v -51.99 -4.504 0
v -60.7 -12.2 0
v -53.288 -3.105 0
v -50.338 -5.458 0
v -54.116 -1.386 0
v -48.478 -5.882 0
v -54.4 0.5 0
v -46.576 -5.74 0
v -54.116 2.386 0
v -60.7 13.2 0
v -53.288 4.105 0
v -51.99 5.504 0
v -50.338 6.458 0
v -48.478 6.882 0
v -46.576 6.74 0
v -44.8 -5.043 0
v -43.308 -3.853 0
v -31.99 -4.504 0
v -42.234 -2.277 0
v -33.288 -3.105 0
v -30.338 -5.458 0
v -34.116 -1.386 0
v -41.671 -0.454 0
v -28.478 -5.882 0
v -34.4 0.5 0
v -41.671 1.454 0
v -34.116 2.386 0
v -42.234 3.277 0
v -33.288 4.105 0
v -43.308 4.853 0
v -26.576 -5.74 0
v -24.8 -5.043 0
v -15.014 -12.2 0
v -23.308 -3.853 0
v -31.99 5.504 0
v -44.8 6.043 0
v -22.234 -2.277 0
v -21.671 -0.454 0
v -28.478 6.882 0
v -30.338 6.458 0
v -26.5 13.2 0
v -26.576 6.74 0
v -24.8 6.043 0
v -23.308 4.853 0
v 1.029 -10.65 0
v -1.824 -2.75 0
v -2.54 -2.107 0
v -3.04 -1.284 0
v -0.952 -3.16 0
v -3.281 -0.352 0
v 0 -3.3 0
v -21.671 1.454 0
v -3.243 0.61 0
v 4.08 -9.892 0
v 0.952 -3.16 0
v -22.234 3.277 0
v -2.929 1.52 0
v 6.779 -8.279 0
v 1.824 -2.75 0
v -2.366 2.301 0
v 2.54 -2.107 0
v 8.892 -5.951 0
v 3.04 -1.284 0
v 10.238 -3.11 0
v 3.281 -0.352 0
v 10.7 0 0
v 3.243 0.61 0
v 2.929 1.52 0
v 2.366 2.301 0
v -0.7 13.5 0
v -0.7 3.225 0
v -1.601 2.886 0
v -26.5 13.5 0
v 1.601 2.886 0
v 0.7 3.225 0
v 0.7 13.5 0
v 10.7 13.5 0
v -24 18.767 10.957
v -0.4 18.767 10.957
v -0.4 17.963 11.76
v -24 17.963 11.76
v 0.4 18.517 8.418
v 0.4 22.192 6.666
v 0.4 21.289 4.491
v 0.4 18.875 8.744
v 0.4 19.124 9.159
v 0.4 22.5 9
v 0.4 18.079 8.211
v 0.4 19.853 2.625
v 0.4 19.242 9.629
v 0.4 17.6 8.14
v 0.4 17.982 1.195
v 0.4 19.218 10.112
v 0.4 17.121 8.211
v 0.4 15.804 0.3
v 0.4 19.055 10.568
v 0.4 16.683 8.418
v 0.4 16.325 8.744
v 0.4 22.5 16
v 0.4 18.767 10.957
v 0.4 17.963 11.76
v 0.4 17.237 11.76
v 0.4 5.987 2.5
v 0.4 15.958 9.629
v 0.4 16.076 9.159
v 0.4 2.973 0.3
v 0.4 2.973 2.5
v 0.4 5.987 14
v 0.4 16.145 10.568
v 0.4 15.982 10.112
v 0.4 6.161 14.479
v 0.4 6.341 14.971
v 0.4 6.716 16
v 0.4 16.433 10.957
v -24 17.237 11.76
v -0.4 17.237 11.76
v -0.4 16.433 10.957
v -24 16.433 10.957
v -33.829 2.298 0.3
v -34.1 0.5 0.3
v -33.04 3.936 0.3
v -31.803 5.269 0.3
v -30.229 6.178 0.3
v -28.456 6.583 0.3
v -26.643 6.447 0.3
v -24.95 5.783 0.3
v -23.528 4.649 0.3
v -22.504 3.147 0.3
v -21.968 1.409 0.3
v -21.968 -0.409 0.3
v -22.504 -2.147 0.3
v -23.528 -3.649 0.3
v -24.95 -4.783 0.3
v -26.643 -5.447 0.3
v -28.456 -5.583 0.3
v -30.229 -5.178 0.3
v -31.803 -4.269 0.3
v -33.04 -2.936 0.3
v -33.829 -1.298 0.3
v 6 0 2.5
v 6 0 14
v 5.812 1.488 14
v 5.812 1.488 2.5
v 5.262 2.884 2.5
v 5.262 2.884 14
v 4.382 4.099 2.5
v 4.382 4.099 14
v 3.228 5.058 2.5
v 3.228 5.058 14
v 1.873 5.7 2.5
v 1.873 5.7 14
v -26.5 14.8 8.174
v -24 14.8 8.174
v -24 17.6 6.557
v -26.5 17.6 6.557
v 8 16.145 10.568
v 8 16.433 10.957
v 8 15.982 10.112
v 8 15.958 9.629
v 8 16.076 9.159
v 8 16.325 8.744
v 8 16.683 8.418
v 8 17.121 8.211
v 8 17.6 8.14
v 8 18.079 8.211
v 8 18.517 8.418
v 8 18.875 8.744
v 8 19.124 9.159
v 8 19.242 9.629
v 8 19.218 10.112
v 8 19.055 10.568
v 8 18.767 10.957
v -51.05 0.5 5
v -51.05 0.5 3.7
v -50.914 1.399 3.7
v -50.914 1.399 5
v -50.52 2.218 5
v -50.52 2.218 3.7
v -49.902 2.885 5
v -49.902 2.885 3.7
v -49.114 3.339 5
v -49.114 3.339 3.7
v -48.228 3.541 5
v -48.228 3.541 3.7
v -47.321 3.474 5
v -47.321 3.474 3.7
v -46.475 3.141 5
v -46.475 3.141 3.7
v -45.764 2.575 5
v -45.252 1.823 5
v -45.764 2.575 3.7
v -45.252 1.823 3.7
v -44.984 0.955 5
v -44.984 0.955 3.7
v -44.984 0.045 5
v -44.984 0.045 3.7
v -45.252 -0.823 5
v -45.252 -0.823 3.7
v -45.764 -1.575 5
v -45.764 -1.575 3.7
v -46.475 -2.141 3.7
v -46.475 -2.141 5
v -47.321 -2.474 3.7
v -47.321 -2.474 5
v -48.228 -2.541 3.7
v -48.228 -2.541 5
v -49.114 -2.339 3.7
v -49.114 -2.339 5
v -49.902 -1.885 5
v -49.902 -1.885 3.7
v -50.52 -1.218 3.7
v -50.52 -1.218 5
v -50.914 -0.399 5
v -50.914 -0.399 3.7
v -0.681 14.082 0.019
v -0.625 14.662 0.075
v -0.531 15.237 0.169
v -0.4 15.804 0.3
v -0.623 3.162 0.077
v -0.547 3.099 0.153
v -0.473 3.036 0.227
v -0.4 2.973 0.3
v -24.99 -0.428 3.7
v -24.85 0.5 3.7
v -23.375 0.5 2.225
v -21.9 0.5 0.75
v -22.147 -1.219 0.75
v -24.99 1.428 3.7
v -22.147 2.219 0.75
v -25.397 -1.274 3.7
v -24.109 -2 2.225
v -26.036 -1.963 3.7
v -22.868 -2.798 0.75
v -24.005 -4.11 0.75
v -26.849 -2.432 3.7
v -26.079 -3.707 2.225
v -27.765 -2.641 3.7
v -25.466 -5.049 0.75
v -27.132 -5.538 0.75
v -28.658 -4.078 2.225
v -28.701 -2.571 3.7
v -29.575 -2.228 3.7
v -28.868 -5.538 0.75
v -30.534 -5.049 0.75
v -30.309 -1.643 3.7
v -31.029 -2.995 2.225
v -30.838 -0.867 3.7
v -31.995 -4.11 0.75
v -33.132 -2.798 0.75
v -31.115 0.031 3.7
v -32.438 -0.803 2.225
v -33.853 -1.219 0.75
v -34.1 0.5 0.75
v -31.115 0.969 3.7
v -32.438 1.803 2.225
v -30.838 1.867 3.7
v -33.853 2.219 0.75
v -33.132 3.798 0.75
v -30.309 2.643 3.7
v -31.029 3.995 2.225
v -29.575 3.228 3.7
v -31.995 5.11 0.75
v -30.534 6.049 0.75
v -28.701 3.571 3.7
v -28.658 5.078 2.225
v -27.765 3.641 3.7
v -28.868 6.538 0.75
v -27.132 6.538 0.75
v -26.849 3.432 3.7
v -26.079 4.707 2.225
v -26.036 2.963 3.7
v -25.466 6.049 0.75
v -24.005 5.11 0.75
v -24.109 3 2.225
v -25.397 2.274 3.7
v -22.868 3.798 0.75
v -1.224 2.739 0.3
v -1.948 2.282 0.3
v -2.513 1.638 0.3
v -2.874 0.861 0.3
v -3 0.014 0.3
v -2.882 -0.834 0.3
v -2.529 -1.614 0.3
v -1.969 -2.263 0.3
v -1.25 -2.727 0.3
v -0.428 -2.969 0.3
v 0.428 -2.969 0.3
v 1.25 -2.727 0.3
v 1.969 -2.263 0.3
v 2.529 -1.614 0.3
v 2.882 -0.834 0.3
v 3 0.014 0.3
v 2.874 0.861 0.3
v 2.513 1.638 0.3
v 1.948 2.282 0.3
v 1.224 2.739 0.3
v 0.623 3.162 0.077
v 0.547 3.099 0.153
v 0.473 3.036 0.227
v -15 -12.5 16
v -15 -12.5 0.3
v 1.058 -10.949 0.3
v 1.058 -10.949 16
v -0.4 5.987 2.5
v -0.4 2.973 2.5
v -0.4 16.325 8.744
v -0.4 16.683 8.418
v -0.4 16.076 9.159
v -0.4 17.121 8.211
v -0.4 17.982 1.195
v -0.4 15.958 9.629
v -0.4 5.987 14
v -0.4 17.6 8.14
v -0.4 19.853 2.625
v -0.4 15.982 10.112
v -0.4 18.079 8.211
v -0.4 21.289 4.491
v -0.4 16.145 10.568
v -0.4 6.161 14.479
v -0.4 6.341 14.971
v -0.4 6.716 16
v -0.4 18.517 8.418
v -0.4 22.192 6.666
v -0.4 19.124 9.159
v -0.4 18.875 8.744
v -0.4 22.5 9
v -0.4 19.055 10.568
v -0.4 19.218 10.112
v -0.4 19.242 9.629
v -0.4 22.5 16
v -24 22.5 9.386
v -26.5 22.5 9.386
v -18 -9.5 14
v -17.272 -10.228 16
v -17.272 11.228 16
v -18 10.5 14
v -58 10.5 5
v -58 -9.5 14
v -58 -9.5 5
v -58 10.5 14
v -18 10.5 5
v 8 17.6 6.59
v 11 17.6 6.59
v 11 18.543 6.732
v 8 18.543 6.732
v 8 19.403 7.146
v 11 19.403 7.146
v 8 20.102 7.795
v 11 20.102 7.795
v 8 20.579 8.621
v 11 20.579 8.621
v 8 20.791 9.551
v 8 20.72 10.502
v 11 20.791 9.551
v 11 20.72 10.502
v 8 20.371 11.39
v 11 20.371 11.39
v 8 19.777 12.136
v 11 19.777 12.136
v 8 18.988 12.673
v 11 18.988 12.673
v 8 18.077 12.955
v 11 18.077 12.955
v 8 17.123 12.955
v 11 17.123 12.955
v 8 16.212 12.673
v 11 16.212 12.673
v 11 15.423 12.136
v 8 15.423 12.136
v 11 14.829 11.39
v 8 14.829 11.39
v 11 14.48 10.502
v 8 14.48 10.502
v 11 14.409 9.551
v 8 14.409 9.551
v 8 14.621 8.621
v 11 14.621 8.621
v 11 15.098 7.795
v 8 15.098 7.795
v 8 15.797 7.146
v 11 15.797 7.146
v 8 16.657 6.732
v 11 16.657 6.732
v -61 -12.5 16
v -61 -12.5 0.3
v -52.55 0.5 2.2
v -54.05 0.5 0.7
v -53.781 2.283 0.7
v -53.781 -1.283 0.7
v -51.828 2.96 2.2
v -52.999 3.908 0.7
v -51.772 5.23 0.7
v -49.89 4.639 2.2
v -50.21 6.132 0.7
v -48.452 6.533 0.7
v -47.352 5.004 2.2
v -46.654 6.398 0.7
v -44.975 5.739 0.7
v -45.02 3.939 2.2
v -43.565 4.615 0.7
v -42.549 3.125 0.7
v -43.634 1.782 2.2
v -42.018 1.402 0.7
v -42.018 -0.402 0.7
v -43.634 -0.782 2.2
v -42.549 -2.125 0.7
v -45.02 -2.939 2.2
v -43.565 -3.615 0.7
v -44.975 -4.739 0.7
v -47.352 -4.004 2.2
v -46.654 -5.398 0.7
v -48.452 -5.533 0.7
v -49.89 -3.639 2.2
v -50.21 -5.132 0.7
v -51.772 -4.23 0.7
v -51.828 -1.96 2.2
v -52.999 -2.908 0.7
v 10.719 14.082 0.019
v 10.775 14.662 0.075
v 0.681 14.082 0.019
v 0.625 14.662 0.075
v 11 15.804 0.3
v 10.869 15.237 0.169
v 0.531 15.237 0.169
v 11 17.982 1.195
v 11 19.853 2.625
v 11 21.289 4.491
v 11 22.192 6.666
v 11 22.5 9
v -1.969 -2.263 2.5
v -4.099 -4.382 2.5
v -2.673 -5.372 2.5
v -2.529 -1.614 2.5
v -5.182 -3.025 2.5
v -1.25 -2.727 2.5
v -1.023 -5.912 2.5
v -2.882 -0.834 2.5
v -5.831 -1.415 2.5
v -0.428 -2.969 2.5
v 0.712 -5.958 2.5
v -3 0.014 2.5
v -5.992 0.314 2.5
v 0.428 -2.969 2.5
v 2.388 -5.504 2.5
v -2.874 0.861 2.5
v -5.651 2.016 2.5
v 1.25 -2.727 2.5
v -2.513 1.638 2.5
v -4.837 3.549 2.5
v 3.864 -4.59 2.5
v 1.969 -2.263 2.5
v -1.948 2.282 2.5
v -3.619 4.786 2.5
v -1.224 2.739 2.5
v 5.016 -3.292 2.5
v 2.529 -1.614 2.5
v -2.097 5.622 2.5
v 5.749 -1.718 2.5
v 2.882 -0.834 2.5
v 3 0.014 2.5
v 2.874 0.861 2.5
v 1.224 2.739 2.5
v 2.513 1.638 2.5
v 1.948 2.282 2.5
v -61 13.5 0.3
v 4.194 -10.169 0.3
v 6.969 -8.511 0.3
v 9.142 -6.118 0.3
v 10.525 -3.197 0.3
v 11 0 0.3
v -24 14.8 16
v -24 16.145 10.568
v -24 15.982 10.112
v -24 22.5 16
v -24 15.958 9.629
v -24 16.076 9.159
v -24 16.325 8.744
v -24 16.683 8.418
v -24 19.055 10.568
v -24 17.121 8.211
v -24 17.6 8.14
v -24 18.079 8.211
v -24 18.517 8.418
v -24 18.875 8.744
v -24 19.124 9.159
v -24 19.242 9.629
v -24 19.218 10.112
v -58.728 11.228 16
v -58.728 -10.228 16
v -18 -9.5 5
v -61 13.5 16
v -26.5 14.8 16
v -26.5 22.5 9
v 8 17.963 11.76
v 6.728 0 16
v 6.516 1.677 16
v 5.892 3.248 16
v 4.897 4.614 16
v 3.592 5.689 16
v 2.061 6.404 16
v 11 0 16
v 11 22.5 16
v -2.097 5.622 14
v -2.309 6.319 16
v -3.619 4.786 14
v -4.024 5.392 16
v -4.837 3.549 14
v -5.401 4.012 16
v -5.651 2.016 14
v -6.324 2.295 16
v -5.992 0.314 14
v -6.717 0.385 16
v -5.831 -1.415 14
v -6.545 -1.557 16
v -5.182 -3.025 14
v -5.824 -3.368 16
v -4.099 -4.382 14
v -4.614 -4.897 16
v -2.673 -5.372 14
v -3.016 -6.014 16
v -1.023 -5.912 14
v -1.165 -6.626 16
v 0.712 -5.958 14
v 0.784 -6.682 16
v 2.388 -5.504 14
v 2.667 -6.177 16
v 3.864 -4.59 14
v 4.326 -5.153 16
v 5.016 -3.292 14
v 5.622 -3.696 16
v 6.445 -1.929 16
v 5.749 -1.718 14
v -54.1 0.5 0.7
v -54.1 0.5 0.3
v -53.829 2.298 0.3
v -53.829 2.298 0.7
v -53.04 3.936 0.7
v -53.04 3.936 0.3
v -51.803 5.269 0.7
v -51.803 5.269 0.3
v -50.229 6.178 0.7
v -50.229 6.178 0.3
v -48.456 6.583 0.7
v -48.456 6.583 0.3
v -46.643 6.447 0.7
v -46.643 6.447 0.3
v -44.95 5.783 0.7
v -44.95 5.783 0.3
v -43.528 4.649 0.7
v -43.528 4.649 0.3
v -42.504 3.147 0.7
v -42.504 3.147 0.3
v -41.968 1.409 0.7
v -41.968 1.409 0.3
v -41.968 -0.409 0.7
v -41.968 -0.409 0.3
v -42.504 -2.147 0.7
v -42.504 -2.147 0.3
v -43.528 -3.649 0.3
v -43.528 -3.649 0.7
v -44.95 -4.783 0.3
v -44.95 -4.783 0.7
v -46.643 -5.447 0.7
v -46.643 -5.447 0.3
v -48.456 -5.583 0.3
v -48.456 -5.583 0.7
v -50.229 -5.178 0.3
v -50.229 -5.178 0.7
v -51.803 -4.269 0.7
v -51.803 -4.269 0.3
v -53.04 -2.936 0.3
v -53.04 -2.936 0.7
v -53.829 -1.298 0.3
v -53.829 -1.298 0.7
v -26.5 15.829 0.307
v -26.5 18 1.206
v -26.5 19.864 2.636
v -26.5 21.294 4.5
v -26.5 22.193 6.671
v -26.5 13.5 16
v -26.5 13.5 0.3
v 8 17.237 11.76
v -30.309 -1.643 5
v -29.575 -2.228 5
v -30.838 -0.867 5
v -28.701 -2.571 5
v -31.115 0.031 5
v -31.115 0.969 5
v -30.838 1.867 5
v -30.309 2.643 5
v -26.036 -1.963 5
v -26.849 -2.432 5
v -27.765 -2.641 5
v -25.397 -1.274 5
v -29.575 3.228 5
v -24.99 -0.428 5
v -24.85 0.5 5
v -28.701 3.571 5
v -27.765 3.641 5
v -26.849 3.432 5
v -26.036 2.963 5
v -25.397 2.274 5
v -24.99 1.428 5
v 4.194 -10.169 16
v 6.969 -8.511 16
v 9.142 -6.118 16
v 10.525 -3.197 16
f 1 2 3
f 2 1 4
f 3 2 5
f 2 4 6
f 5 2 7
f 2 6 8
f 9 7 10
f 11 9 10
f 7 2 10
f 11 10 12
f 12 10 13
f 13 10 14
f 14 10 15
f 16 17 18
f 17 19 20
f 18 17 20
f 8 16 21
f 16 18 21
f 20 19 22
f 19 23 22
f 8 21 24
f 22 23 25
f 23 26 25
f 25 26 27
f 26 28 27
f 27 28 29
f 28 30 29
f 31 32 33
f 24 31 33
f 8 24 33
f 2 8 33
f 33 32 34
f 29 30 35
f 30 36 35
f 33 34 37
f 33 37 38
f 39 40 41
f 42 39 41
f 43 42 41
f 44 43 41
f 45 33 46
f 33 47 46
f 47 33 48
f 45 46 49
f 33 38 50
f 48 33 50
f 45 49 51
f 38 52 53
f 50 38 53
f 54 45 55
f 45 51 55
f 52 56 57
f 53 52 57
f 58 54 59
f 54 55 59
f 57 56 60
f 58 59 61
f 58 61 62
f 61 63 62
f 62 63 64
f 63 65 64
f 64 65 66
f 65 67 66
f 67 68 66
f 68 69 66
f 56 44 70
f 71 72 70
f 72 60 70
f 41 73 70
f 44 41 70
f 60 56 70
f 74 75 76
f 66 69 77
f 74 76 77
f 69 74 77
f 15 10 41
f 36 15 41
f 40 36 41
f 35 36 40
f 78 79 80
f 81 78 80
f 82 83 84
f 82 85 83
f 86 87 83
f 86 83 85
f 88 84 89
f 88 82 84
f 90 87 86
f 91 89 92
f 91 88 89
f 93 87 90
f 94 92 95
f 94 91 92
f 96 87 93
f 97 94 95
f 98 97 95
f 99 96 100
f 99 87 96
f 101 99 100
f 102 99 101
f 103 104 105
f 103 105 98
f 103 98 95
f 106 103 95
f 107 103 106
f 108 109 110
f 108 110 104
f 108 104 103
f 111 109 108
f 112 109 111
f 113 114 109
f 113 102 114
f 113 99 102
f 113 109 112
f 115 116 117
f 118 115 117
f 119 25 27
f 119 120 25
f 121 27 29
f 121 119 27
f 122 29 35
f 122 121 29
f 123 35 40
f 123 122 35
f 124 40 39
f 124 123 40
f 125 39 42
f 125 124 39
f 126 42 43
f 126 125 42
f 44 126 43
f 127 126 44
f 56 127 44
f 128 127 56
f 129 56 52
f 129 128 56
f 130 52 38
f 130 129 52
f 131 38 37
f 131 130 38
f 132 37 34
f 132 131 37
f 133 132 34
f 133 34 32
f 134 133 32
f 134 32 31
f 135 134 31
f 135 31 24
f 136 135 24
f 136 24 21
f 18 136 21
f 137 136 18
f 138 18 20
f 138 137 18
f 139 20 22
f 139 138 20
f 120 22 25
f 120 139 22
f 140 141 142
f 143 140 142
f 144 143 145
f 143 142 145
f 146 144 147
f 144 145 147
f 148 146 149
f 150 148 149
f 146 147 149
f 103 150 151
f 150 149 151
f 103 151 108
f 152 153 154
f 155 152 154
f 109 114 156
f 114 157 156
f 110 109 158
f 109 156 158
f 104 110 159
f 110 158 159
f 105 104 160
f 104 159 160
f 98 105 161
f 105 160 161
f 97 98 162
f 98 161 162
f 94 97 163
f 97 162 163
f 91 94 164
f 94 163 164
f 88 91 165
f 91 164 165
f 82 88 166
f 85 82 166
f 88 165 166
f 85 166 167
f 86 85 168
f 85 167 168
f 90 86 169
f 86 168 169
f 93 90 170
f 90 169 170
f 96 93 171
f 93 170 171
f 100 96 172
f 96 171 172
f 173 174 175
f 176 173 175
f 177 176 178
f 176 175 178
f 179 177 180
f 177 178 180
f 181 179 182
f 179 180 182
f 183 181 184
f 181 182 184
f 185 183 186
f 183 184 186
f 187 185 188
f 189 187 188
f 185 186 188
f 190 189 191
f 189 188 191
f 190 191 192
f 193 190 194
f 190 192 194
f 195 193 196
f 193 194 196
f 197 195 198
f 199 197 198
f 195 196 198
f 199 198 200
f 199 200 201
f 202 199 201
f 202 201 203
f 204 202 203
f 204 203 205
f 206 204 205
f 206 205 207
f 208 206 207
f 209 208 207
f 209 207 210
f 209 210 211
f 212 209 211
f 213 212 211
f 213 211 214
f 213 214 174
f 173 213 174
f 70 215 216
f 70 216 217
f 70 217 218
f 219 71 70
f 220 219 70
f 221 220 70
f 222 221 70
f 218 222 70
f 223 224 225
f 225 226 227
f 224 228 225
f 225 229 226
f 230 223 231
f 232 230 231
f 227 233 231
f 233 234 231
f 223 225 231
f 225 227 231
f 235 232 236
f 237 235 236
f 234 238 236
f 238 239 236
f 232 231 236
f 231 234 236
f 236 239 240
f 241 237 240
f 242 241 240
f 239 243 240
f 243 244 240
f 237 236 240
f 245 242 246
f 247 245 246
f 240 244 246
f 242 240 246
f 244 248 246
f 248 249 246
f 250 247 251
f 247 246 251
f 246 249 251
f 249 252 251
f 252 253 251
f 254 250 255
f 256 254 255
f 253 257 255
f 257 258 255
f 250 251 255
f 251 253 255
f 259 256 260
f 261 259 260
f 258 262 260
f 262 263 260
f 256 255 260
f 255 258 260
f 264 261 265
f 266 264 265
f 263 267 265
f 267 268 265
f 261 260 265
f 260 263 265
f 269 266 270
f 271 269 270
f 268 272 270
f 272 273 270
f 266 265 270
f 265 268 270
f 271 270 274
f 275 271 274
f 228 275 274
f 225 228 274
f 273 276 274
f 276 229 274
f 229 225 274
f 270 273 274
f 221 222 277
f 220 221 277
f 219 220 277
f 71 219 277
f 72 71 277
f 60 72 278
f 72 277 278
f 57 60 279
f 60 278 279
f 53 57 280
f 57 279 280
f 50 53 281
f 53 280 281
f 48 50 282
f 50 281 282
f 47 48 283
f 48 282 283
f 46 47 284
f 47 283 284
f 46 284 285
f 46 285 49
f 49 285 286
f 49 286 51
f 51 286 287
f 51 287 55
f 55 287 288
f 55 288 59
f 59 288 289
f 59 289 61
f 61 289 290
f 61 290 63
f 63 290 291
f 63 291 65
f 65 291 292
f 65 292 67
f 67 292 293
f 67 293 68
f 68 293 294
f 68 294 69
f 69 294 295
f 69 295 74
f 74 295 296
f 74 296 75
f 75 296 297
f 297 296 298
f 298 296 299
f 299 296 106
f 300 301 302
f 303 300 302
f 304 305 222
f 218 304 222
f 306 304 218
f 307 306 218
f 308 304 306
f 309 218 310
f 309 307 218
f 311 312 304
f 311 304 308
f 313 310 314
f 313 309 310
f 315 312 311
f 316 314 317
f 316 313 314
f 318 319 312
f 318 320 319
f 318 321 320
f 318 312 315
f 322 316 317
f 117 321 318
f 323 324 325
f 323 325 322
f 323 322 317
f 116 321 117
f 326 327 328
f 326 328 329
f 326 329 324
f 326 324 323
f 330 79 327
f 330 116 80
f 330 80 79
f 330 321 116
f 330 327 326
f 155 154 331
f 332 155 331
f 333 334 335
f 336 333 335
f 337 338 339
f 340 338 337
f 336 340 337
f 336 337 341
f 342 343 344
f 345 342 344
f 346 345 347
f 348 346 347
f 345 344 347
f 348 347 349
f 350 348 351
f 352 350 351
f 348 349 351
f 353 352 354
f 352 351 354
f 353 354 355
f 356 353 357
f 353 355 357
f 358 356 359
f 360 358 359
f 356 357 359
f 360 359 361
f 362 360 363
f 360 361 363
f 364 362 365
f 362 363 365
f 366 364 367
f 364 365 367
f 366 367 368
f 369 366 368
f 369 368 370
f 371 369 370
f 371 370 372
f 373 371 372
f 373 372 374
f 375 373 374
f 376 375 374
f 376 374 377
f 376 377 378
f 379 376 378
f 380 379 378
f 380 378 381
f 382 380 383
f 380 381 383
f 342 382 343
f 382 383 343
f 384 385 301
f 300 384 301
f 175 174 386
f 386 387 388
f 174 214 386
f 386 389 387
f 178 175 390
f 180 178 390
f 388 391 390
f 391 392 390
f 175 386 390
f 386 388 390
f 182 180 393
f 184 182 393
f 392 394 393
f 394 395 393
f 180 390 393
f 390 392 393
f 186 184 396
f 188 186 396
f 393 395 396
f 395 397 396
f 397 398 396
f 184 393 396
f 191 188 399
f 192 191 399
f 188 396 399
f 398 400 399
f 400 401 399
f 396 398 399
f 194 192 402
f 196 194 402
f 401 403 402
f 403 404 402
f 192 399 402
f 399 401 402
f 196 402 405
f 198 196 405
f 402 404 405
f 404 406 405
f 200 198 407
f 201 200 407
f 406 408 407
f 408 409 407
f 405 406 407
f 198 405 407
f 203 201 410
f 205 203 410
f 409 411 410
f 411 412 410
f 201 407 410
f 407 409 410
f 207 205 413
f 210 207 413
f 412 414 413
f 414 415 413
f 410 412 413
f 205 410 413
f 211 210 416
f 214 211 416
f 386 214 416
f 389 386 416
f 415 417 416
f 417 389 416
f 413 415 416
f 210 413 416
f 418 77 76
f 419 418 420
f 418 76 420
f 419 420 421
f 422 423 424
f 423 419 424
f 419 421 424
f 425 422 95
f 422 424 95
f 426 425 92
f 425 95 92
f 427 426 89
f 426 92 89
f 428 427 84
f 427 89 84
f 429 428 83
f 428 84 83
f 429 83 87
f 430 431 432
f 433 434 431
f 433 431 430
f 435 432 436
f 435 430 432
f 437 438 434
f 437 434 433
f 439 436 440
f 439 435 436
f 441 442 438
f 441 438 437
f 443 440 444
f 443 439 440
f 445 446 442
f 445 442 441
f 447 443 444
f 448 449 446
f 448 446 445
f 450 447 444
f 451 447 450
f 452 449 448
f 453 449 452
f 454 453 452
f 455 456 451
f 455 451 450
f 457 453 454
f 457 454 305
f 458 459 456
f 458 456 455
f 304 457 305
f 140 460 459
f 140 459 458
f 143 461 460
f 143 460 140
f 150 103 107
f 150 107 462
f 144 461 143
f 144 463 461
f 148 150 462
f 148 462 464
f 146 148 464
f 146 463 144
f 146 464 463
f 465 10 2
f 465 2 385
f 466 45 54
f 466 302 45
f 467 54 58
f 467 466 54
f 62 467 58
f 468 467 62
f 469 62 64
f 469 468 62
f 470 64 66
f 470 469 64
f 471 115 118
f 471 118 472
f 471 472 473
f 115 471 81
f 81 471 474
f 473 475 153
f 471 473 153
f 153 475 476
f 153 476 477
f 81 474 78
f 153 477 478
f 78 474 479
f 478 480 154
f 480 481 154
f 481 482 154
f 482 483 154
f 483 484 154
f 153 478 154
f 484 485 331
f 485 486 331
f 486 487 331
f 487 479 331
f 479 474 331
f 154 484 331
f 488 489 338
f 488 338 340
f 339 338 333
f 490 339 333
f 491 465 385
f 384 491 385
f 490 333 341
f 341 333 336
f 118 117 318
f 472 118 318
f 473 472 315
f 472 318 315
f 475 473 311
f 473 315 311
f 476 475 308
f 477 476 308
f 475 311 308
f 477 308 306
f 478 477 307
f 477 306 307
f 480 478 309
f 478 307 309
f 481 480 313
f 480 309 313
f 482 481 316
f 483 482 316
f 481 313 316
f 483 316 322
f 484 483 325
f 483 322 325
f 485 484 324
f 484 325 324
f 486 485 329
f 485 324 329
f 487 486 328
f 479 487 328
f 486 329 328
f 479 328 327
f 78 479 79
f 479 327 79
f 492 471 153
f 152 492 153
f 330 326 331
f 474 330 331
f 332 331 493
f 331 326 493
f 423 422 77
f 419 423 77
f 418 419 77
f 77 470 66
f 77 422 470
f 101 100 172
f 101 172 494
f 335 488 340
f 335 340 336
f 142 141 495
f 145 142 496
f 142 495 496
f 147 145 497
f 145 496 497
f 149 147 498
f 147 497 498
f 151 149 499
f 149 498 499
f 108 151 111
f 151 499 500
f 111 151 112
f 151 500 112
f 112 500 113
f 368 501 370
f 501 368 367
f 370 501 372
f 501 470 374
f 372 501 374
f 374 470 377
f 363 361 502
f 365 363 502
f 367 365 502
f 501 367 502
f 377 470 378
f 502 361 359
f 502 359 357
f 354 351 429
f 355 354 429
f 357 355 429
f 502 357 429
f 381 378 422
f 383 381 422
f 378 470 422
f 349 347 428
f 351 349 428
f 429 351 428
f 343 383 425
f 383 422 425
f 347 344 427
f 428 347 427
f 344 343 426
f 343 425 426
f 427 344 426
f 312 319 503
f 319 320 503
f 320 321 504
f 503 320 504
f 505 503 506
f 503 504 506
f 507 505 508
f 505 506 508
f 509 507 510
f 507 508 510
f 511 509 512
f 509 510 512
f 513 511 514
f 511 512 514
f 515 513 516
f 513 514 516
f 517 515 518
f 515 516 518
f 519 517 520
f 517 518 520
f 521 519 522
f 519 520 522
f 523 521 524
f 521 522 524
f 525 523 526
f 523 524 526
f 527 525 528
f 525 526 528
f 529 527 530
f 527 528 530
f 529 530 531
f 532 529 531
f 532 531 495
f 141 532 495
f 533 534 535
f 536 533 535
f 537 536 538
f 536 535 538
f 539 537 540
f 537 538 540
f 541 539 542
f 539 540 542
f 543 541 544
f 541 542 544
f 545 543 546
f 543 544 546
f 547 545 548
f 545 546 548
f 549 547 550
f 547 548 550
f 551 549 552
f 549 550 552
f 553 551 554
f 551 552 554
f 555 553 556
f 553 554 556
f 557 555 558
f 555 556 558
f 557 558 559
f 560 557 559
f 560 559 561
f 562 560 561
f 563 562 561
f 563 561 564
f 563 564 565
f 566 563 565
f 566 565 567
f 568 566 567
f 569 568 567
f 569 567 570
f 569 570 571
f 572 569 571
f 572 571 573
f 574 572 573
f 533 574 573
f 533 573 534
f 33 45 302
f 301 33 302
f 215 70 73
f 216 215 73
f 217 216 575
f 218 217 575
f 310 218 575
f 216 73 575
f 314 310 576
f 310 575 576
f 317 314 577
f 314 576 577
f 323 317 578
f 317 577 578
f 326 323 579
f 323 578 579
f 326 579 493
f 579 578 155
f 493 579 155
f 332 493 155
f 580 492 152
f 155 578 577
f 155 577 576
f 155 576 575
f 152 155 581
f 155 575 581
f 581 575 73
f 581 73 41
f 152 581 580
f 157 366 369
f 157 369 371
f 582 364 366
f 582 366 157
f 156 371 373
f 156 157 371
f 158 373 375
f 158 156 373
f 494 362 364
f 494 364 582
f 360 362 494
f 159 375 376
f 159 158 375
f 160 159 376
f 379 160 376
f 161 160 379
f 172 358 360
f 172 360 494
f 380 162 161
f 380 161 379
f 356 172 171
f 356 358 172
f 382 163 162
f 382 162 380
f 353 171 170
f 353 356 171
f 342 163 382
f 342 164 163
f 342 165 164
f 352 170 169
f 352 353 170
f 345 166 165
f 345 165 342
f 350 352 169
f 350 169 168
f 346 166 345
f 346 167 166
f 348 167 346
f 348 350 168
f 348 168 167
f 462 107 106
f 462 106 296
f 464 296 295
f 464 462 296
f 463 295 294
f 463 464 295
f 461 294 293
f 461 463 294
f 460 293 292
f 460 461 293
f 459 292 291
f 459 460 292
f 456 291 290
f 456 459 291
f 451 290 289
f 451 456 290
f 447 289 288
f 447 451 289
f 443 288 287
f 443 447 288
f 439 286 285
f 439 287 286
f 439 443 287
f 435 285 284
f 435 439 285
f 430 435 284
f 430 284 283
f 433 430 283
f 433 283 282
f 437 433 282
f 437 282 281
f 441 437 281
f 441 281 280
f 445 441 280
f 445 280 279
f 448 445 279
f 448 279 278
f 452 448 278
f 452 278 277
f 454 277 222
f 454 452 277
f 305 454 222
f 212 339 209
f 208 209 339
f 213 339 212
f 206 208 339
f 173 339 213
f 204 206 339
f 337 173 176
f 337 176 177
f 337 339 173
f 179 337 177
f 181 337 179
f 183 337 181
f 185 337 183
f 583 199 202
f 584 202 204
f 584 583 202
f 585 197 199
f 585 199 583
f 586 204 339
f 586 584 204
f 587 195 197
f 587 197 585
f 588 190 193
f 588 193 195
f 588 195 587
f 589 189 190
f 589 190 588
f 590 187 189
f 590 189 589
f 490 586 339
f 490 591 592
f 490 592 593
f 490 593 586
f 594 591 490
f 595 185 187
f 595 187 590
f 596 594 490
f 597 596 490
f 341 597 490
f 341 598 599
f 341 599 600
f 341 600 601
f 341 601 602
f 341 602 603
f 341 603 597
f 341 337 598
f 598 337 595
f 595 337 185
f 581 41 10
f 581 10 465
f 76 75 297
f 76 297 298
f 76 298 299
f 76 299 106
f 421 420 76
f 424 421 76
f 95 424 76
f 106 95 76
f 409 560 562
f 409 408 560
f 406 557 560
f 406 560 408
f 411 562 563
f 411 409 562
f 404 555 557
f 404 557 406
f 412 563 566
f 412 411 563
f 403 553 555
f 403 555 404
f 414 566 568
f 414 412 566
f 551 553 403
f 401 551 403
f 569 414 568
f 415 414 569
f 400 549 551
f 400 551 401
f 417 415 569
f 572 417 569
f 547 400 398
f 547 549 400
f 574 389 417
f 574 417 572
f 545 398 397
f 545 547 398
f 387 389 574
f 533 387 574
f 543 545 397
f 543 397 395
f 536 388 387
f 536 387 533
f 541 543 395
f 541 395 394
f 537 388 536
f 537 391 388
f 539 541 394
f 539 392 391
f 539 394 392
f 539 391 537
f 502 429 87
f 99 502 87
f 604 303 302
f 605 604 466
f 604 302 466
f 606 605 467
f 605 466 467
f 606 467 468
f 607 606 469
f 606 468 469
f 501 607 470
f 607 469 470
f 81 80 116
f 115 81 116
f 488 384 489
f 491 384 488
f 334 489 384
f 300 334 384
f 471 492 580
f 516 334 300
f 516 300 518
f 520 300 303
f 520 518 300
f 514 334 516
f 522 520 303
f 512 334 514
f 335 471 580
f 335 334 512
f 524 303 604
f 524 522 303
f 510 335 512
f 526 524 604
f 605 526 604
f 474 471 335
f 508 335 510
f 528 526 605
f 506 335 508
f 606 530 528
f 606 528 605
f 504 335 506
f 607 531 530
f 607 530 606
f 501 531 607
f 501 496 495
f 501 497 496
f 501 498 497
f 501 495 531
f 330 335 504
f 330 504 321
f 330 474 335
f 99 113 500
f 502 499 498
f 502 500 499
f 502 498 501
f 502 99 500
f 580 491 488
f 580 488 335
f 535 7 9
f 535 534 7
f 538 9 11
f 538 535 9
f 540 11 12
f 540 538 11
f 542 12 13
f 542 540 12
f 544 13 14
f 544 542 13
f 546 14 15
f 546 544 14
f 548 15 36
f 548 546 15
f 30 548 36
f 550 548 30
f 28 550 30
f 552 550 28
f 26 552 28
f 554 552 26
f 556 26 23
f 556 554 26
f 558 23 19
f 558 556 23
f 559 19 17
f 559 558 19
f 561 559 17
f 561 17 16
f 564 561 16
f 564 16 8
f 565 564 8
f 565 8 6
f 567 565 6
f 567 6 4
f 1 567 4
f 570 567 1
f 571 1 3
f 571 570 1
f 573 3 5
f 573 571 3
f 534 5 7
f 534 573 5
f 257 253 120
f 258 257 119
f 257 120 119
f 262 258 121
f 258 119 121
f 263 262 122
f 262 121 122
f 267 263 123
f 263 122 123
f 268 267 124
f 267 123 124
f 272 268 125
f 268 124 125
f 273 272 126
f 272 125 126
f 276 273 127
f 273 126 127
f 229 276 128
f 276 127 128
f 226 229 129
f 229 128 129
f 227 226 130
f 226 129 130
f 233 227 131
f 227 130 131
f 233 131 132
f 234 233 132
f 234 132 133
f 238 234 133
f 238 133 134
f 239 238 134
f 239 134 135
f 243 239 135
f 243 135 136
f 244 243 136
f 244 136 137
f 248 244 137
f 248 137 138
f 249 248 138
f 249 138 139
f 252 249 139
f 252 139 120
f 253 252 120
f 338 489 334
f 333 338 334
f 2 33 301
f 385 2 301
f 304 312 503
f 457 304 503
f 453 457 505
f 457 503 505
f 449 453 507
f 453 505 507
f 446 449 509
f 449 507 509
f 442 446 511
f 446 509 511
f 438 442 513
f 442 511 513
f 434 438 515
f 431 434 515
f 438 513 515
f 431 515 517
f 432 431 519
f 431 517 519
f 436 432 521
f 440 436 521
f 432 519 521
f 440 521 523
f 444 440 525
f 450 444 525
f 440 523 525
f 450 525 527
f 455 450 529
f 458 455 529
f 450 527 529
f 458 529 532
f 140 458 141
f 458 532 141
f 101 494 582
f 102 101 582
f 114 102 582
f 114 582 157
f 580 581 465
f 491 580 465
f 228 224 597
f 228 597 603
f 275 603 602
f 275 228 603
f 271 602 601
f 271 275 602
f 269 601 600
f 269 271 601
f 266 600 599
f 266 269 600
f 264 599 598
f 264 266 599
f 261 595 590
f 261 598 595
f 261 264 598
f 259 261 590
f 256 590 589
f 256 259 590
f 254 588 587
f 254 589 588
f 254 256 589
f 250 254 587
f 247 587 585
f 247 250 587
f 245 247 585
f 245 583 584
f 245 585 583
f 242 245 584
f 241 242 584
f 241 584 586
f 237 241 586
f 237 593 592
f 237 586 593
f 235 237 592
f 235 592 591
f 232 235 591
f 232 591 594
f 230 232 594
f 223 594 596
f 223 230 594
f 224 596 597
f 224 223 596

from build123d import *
from OCP.BRepFilletAPI import BRepFilletAPI_MakeChamfer

# Parameters (mm, degrees)
SKETCH1_R           = 2.5
SKETCH1_R_2         = 3.15
BOSS_EXTRUDE1_DEPTH = 16
SKETCH2_W           = 40
SKETCH2_H           = 20
CUT_EXTRUDE1_DEPTH  = 11
FILLET2_R           = 9
SKETCH3_R           = 6
CUT_EXTRUDE2_DEPTH  = 13.5
CUT_EXTRUDE5_DEPTH  = 67.957075802
SKETCH7_R           = 3.05
CUT_EXTRUDE6_DEPTH  = 67.957075802
CHAMFER2_SIZE       = 2
CHAMFER2_SIZE2      = 0.727940469
SKETCH10_R          = 6.1
CUT_EXTRUDE8_DEPTH  = 0.7
CHAMFER3_SIZE       = 3
CHAMFER4_SIZE       = 0.3
SKETCH11_R          = 1.65
CUT_EXTRUDE9_DEPTH  = 78.111931632
SKETCH12_R          = 3.2
CUT_EXTRUDE10_DEPTH = 3
CUT_EXTRUDE11_START = -35
CUT_EXTRUDE11_DEPTH = 43.111931632
CHAMFER5_SIZE       = 2
CHAMFER5_SIZE2      = 0.727940469
CUT_EXTRUDE12_DEPTH = 78.111931632


with BuildPart() as part:
    # Sketch1 → Boss-Extrude1 (new body)
    with BuildSketch(Plane.XY):
        with BuildLine():
            Line((-61, 13.5), (-61, -12.5))
            Line((-61, -12.5), (-15, -12.5))
            Line((-15, -12.5), (1.057538487, -10.949046184))
            ThreePointArc((1.057538487, -10.949046184), (8.143491983, -7.394831866), (11, 0))
            Line((11, 0), (11, 22.5))
            Line((11, 22.5), (-26.5, 22.5))
            Line((-26.5, 22.5), (-26.5, 13.5))
            Line((-26.5, 13.5), (-61, 13.5))
        make_face()
        with Locations((-48, 0.5)):
            Circle(SKETCH1_R, mode=Mode.SUBTRACT)
        with Locations((-28, 0.5)):
            Circle(SKETCH1_R_2, mode=Mode.SUBTRACT)
    extrude(amount=BOSS_EXTRUDE1_DEPTH)

    # Sketch2 → Cut-Extrude1 (cut)
    with BuildSketch(Plane.XY.offset(16)):
        with Locations((-38, 0.5)):
            Rectangle(SKETCH2_W, SKETCH2_H)
    extrude(amount=-CUT_EXTRUDE1_DEPTH, mode=Mode.SUBTRACT)

    # Fillet2
    fillet2_edges = [part.edges().sort_by_distance(p)[0] for p in [
        (-7.75, 22.5, 0),
    ]]
    fillet(fillet2_edges, radius=FILLET2_R)

    # Sketch3 → Cut-Extrude2 (cut)
    with BuildSketch(Plane.XY.offset(16)):
        Circle(SKETCH3_R)
    extrude(amount=-CUT_EXTRUDE2_DEPTH, mode=Mode.SUBTRACT)

    # Sketch6 → Cut-Extrude5 (cut, through all)
    with BuildSketch(Plane.XY.offset(16)):
        with BuildLine():
            Line((-0.4, 24.334661422), (0.4, 24.334661422))
            Line((0.4, 24.334661422), (0.4, 2.973213749))
            ThreePointArc((0.4, 2.973213749), (0, -3), (-0.4, 2.973213749))
            Line((-0.4, 2.973213749), (-0.4, 24.334661422))
        make_face()
    extrude(amount=-CUT_EXTRUDE5_DEPTH, mode=Mode.SUBTRACT)

    # Sketch7 → Cut-Extrude6 (cut, through all)
    with BuildSketch(Plane(origin=(0, 0, 0), x_dir=(-1, 0, 0), z_dir=(0, 0, -1))):
        with Locations((48, 0.5)):
            Circle(SKETCH7_R)
    extrude(amount=-CUT_EXTRUDE6_DEPTH, mode=Mode.SUBTRACT)

    # Chamfer2: one chamfer whose edges measure the first distance from different faces: ONE call of the kernel's chamfer builder (chamfer() names one face for all edges)
    chamfer2_edges_1 = [part.edges().sort_by_distance(p)[0] for p in [
        (-58, 0.5, 16),
    ]]
    chamfer2_side_1 = [part.faces().sort_by_distance(p)[0] for p in [
        (-58, 0.5, 10.5),
    ]]
    chamfer2_edges_2 = [part.edges().sort_by_distance(p)[0] for p in [
        (-38, -9.5, 16),
    ]]
    chamfer2_side_2 = [part.faces().sort_by_distance(p)[0] for p in [
        (-38, -9.5, 10.5),
    ]]
    chamfer2_edges_3 = [part.edges().sort_by_distance(p)[0] for p in [
        (-18, 0.5, 16),
    ]]
    chamfer2_side_3 = [part.faces().sort_by_distance(p)[0] for p in [
        (-18, 0.5, 10.5),
    ]]
    chamfer2_edges_4 = [part.edges().sort_by_distance(p)[0] for p in [
        (-38, 10.5, 16),
    ]]
    chamfer2_side_4 = [part.faces().sort_by_distance(p)[0] for p in [
        (-38, 10.5, 10.5),
    ]]
    chamfer2 = BRepFilletAPI_MakeChamfer(part.part.solid().wrapped)
    for e in chamfer2_edges_1:
        chamfer2.Add(CHAMFER2_SIZE, CHAMFER2_SIZE2, e.wrapped, chamfer2_side_1[0].wrapped)  # the first distance lies on this face
    for e in chamfer2_edges_2:
        chamfer2.Add(CHAMFER2_SIZE, CHAMFER2_SIZE2, e.wrapped, chamfer2_side_2[0].wrapped)  # the first distance lies on this face
    for e in chamfer2_edges_3:
        chamfer2.Add(CHAMFER2_SIZE, CHAMFER2_SIZE2, e.wrapped, chamfer2_side_3[0].wrapped)  # the first distance lies on this face
    for e in chamfer2_edges_4:
        chamfer2.Add(CHAMFER2_SIZE, CHAMFER2_SIZE2, e.wrapped, chamfer2_side_4[0].wrapped)  # the first distance lies on this face
    add(Compound.cast(chamfer2.Shape()), mode=Mode.REPLACE)

    # Sketch10 → Cut-Extrude8 (cut)
    with BuildSketch(Plane(origin=(0, 0, 0), x_dir=(-1, 0, 0), z_dir=(0, 0, -1))):
        with Locations((28, 0.5)):
            Circle(SKETCH10_R)
        with Locations((48, 0.5)):
            Circle(SKETCH10_R)
    extrude(amount=-CUT_EXTRUDE8_DEPTH, mode=Mode.SUBTRACT)

    # Chamfer3
    # the kernel refuses this chamfer: 3 mm, written as the material it takes off along each edge
    with BuildSketch(Plane(origin=(-48, 0.5, 0.7), x_dir=(-1, 0, 0), z_dir=(0, -1, 0))) as chamfer3_piece_1:
        Polygon((3.05, -CHAMFER3_SIZE), (3.05 + CHAMFER3_SIZE, 0), (3.05, 0), align=None)
    revolve(axis=Axis((-48, 0.5, 0.7), (0, 0, -1)), mode=Mode.SUBTRACT)
    with BuildSketch(Plane(origin=(-28, 0.5, 0.7), x_dir=(1, 0, 0), z_dir=(0, 1, 0))) as chamfer3_piece_2_section:
        Polygon((3.15, -CHAMFER3_SIZE), (3.15 + CHAMFER3_SIZE, 0), (3.15, 0), align=None)
    chamfer3_piece_2 = revolve(axis=Axis((-28, 0.5, 0.7), (0, 0, -1)), mode=Mode.PRIVATE)
    chamfer3_piece_2 = chamfer3_piece_2 & Plane(origin=(-28, 0.5, 0.7), x_dir=(-1, 0, 0), z_dir=(0, 0, -1)) * Cylinder(6.1, 25, mode=Mode.PRIVATE)
    add(chamfer3_piece_2, mode=Mode.SUBTRACT)

    # Chamfer4
    # the kernel refuses this chamfer: 0.3 mm, written as the material it takes off along each edge
    with BuildSketch(Plane(origin=(0, 0, 0), x_dir=(-0.0031415874858789867, 0.9999950652018582, 0), z_dir=(0.9999950652018582, 0.0031415874858789867, 0))) as chamfer4_piece_1:
        Polygon((3 + CHAMFER4_SIZE, 0), (3, CHAMFER4_SIZE), (3, 0), align=None)
    revolve(axis=Axis((0, 0, 0), (0, 0, 1)), revolution_arc=359.64, mode=Mode.SUBTRACT)
    with BuildSketch(Plane(origin=(-61, 14.271504896, 0), x_dir=(1, 0, 0), z_dir=(0, -1, 0))) as chamfer4_piece_2:
        Polygon((CHAMFER4_SIZE, 0), (0, CHAMFER4_SIZE), (0, 0), align=None)
    extrude(amount=27.543009793, mode=Mode.SUBTRACT)
    with BuildSketch(Plane(origin=(-61.771504896, -12.5, 0), x_dir=(0, 1, 0), z_dir=(1, 0, 0))) as chamfer4_piece_3:
        Polygon((CHAMFER4_SIZE, 0), (0, CHAMFER4_SIZE), (0, 0), align=None)
    extrude(amount=50.629029378, mode=Mode.SUBTRACT)
    with BuildSketch(Plane(origin=(-18.839655792, -12.870861873, 0), x_dir=(-0.0961398624557926, 0.9953678349469514, 0), z_dir=(0.9953678349469514, 0.09613986245579259, 0))) as chamfer4_piece_4:
        Polygon((CHAMFER4_SIZE, 0), (0, CHAMFER4_SIZE), (0, 0), align=None)
    extrude(amount=19.989790287, mode=Mode.SUBTRACT)
    with BuildSketch(Plane(origin=(0, 0, 0), x_dir=(0.0961398624557928, -0.9953678349469512, 0), z_dir=(-0.9953678349469512, -0.0961398624557928, 0))) as chamfer4_piece_5:
        Polygon((11 - CHAMFER4_SIZE, 0), (11, CHAMFER4_SIZE), (11, 0), align=None)
    revolve(axis=Axis((0, 0, 0), (0, 0, 1)), revolution_arc=84.483070562, mode=Mode.SUBTRACT)
    with BuildSketch(Plane(origin=(-28, 0.5, 0), x_dir=(-1, 0, 0), z_dir=(0, -1, 0))) as chamfer4_piece_6:
        Polygon((6.1 + CHAMFER4_SIZE, 0), (6.1, -CHAMFER4_SIZE), (6.1, 0), align=None)
    revolve(axis=Axis((-28, 0.5, 0), (0, 0, -1)), mode=Mode.SUBTRACT)
    with BuildSketch(Plane(origin=(-48, 0.5, 0), x_dir=(-1, 0, 0), z_dir=(0, -1, 0))) as chamfer4_piece_7:
        Polygon((6.1 + CHAMFER4_SIZE, 0), (6.1, -CHAMFER4_SIZE), (6.1, 0), align=None)
    revolve(axis=Axis((-48, 0.5, 0), (0, 0, -1)), mode=Mode.SUBTRACT)
    with BuildSketch(Plane(origin=(0.4, 17.357524482, 0), x_dir=(1, 0, 0), z_dir=(0, -1, 0)), Plane(origin=(-0.4, 2.201708853, 0), x_dir=(-1, 0, 0), z_dir=(0, 1, 0))) as chamfer4_piece_8:
        Polygon((CHAMFER4_SIZE, 0), (0, CHAMFER4_SIZE), (0, 0), align=None)
    extrude(amount=15.155815629, mode=Mode.SUBTRACT)
    with BuildSketch(Plane(origin=(11, 0, 0), x_dir=(0, 0, 1), z_dir=(0, 1, 0))) as chamfer4_piece_9:
        Polygon((CHAMFER4_SIZE, 0), (0, -CHAMFER4_SIZE), (0, 0), align=None)
    extrude(amount=17.357524482, mode=Mode.SUBTRACT)
    with BuildSketch(Plane(origin=(-26.5, 13.5, 0), x_dir=(0, -1, 0), z_dir=(-1, 0, 0))) as chamfer4_piece_10:
        Polygon((CHAMFER4_SIZE, 0), (0, CHAMFER4_SIZE), (0, 0), align=None)
    extrude(amount=35.271504896, mode=Mode.SUBTRACT)

    # Sketch11 → Cut-Extrude9 (cut, through all)
    with BuildSketch(Plane(origin=(11, 0, 0), x_dir=(0, 0, -1), z_dir=(1, 0, 0))):
        with Locations((-9.790309274, 17.6)):
            Circle(SKETCH11_R)
    extrude(amount=-CUT_EXTRUDE9_DEPTH, mode=Mode.SUBTRACT)

    # Sketch12 → Cut-Extrude10 (cut)
    with BuildSketch(Plane(origin=(11, 0, 0), x_dir=(0, 0, -1), z_dir=(1, 0, 0))):
        with Locations((-9.790309274, 17.6)):
            Circle(SKETCH12_R)
    extrude(amount=-CUT_EXTRUDE10_DEPTH, mode=Mode.SUBTRACT)

    # Sketch13 → Cut-Extrude11 (cut, through all)
    with BuildSketch(Plane(origin=(11, 0, 0), x_dir=(0, 0, -1), z_dir=(1, 0, 0)).offset(CUT_EXTRUDE11_START)):
        Polygon((-9.386164085, 22.5), (-16, 22.5), (-16, 14.8), (-8.17372852, 14.8), (-6.557147766, 17.6), align=None)
    extrude(amount=-CUT_EXTRUDE11_DEPTH, mode=Mode.SUBTRACT)

    # Chamfer5
    chamfer5_edges = [part.edges().sort_by_distance(p)[0] for p in [
        (-4.098780306, -4.38178046, 16),
    ]]
    chamfer5_side = [part.faces().sort_by_distance(p)[0] for p in [
        (-4.098780306, -4.38178046, 9.25),
    ]]
    chamfer(chamfer5_edges, length=CHAMFER5_SIZE, length2=CHAMFER5_SIZE2, reference=chamfer5_side[0])

    # Sketch14 → Cut-Extrude12 (cut, through all)
    with BuildSketch(Plane(origin=(11, 0, 0), x_dir=(0, 0, -1), z_dir=(1, 0, 0))):
        Polygon((-9.790309274, 17.6), (-10.957035463, 18.766726189), (-11.760309274, 17.963452378), (-11.760309274, 17.236547622), (-10.957035463, 16.433273811), align=None)
    extrude(amount=-CUT_EXTRUDE12_DEPTH, mode=Mode.SUBTRACT)


solid = part.part
